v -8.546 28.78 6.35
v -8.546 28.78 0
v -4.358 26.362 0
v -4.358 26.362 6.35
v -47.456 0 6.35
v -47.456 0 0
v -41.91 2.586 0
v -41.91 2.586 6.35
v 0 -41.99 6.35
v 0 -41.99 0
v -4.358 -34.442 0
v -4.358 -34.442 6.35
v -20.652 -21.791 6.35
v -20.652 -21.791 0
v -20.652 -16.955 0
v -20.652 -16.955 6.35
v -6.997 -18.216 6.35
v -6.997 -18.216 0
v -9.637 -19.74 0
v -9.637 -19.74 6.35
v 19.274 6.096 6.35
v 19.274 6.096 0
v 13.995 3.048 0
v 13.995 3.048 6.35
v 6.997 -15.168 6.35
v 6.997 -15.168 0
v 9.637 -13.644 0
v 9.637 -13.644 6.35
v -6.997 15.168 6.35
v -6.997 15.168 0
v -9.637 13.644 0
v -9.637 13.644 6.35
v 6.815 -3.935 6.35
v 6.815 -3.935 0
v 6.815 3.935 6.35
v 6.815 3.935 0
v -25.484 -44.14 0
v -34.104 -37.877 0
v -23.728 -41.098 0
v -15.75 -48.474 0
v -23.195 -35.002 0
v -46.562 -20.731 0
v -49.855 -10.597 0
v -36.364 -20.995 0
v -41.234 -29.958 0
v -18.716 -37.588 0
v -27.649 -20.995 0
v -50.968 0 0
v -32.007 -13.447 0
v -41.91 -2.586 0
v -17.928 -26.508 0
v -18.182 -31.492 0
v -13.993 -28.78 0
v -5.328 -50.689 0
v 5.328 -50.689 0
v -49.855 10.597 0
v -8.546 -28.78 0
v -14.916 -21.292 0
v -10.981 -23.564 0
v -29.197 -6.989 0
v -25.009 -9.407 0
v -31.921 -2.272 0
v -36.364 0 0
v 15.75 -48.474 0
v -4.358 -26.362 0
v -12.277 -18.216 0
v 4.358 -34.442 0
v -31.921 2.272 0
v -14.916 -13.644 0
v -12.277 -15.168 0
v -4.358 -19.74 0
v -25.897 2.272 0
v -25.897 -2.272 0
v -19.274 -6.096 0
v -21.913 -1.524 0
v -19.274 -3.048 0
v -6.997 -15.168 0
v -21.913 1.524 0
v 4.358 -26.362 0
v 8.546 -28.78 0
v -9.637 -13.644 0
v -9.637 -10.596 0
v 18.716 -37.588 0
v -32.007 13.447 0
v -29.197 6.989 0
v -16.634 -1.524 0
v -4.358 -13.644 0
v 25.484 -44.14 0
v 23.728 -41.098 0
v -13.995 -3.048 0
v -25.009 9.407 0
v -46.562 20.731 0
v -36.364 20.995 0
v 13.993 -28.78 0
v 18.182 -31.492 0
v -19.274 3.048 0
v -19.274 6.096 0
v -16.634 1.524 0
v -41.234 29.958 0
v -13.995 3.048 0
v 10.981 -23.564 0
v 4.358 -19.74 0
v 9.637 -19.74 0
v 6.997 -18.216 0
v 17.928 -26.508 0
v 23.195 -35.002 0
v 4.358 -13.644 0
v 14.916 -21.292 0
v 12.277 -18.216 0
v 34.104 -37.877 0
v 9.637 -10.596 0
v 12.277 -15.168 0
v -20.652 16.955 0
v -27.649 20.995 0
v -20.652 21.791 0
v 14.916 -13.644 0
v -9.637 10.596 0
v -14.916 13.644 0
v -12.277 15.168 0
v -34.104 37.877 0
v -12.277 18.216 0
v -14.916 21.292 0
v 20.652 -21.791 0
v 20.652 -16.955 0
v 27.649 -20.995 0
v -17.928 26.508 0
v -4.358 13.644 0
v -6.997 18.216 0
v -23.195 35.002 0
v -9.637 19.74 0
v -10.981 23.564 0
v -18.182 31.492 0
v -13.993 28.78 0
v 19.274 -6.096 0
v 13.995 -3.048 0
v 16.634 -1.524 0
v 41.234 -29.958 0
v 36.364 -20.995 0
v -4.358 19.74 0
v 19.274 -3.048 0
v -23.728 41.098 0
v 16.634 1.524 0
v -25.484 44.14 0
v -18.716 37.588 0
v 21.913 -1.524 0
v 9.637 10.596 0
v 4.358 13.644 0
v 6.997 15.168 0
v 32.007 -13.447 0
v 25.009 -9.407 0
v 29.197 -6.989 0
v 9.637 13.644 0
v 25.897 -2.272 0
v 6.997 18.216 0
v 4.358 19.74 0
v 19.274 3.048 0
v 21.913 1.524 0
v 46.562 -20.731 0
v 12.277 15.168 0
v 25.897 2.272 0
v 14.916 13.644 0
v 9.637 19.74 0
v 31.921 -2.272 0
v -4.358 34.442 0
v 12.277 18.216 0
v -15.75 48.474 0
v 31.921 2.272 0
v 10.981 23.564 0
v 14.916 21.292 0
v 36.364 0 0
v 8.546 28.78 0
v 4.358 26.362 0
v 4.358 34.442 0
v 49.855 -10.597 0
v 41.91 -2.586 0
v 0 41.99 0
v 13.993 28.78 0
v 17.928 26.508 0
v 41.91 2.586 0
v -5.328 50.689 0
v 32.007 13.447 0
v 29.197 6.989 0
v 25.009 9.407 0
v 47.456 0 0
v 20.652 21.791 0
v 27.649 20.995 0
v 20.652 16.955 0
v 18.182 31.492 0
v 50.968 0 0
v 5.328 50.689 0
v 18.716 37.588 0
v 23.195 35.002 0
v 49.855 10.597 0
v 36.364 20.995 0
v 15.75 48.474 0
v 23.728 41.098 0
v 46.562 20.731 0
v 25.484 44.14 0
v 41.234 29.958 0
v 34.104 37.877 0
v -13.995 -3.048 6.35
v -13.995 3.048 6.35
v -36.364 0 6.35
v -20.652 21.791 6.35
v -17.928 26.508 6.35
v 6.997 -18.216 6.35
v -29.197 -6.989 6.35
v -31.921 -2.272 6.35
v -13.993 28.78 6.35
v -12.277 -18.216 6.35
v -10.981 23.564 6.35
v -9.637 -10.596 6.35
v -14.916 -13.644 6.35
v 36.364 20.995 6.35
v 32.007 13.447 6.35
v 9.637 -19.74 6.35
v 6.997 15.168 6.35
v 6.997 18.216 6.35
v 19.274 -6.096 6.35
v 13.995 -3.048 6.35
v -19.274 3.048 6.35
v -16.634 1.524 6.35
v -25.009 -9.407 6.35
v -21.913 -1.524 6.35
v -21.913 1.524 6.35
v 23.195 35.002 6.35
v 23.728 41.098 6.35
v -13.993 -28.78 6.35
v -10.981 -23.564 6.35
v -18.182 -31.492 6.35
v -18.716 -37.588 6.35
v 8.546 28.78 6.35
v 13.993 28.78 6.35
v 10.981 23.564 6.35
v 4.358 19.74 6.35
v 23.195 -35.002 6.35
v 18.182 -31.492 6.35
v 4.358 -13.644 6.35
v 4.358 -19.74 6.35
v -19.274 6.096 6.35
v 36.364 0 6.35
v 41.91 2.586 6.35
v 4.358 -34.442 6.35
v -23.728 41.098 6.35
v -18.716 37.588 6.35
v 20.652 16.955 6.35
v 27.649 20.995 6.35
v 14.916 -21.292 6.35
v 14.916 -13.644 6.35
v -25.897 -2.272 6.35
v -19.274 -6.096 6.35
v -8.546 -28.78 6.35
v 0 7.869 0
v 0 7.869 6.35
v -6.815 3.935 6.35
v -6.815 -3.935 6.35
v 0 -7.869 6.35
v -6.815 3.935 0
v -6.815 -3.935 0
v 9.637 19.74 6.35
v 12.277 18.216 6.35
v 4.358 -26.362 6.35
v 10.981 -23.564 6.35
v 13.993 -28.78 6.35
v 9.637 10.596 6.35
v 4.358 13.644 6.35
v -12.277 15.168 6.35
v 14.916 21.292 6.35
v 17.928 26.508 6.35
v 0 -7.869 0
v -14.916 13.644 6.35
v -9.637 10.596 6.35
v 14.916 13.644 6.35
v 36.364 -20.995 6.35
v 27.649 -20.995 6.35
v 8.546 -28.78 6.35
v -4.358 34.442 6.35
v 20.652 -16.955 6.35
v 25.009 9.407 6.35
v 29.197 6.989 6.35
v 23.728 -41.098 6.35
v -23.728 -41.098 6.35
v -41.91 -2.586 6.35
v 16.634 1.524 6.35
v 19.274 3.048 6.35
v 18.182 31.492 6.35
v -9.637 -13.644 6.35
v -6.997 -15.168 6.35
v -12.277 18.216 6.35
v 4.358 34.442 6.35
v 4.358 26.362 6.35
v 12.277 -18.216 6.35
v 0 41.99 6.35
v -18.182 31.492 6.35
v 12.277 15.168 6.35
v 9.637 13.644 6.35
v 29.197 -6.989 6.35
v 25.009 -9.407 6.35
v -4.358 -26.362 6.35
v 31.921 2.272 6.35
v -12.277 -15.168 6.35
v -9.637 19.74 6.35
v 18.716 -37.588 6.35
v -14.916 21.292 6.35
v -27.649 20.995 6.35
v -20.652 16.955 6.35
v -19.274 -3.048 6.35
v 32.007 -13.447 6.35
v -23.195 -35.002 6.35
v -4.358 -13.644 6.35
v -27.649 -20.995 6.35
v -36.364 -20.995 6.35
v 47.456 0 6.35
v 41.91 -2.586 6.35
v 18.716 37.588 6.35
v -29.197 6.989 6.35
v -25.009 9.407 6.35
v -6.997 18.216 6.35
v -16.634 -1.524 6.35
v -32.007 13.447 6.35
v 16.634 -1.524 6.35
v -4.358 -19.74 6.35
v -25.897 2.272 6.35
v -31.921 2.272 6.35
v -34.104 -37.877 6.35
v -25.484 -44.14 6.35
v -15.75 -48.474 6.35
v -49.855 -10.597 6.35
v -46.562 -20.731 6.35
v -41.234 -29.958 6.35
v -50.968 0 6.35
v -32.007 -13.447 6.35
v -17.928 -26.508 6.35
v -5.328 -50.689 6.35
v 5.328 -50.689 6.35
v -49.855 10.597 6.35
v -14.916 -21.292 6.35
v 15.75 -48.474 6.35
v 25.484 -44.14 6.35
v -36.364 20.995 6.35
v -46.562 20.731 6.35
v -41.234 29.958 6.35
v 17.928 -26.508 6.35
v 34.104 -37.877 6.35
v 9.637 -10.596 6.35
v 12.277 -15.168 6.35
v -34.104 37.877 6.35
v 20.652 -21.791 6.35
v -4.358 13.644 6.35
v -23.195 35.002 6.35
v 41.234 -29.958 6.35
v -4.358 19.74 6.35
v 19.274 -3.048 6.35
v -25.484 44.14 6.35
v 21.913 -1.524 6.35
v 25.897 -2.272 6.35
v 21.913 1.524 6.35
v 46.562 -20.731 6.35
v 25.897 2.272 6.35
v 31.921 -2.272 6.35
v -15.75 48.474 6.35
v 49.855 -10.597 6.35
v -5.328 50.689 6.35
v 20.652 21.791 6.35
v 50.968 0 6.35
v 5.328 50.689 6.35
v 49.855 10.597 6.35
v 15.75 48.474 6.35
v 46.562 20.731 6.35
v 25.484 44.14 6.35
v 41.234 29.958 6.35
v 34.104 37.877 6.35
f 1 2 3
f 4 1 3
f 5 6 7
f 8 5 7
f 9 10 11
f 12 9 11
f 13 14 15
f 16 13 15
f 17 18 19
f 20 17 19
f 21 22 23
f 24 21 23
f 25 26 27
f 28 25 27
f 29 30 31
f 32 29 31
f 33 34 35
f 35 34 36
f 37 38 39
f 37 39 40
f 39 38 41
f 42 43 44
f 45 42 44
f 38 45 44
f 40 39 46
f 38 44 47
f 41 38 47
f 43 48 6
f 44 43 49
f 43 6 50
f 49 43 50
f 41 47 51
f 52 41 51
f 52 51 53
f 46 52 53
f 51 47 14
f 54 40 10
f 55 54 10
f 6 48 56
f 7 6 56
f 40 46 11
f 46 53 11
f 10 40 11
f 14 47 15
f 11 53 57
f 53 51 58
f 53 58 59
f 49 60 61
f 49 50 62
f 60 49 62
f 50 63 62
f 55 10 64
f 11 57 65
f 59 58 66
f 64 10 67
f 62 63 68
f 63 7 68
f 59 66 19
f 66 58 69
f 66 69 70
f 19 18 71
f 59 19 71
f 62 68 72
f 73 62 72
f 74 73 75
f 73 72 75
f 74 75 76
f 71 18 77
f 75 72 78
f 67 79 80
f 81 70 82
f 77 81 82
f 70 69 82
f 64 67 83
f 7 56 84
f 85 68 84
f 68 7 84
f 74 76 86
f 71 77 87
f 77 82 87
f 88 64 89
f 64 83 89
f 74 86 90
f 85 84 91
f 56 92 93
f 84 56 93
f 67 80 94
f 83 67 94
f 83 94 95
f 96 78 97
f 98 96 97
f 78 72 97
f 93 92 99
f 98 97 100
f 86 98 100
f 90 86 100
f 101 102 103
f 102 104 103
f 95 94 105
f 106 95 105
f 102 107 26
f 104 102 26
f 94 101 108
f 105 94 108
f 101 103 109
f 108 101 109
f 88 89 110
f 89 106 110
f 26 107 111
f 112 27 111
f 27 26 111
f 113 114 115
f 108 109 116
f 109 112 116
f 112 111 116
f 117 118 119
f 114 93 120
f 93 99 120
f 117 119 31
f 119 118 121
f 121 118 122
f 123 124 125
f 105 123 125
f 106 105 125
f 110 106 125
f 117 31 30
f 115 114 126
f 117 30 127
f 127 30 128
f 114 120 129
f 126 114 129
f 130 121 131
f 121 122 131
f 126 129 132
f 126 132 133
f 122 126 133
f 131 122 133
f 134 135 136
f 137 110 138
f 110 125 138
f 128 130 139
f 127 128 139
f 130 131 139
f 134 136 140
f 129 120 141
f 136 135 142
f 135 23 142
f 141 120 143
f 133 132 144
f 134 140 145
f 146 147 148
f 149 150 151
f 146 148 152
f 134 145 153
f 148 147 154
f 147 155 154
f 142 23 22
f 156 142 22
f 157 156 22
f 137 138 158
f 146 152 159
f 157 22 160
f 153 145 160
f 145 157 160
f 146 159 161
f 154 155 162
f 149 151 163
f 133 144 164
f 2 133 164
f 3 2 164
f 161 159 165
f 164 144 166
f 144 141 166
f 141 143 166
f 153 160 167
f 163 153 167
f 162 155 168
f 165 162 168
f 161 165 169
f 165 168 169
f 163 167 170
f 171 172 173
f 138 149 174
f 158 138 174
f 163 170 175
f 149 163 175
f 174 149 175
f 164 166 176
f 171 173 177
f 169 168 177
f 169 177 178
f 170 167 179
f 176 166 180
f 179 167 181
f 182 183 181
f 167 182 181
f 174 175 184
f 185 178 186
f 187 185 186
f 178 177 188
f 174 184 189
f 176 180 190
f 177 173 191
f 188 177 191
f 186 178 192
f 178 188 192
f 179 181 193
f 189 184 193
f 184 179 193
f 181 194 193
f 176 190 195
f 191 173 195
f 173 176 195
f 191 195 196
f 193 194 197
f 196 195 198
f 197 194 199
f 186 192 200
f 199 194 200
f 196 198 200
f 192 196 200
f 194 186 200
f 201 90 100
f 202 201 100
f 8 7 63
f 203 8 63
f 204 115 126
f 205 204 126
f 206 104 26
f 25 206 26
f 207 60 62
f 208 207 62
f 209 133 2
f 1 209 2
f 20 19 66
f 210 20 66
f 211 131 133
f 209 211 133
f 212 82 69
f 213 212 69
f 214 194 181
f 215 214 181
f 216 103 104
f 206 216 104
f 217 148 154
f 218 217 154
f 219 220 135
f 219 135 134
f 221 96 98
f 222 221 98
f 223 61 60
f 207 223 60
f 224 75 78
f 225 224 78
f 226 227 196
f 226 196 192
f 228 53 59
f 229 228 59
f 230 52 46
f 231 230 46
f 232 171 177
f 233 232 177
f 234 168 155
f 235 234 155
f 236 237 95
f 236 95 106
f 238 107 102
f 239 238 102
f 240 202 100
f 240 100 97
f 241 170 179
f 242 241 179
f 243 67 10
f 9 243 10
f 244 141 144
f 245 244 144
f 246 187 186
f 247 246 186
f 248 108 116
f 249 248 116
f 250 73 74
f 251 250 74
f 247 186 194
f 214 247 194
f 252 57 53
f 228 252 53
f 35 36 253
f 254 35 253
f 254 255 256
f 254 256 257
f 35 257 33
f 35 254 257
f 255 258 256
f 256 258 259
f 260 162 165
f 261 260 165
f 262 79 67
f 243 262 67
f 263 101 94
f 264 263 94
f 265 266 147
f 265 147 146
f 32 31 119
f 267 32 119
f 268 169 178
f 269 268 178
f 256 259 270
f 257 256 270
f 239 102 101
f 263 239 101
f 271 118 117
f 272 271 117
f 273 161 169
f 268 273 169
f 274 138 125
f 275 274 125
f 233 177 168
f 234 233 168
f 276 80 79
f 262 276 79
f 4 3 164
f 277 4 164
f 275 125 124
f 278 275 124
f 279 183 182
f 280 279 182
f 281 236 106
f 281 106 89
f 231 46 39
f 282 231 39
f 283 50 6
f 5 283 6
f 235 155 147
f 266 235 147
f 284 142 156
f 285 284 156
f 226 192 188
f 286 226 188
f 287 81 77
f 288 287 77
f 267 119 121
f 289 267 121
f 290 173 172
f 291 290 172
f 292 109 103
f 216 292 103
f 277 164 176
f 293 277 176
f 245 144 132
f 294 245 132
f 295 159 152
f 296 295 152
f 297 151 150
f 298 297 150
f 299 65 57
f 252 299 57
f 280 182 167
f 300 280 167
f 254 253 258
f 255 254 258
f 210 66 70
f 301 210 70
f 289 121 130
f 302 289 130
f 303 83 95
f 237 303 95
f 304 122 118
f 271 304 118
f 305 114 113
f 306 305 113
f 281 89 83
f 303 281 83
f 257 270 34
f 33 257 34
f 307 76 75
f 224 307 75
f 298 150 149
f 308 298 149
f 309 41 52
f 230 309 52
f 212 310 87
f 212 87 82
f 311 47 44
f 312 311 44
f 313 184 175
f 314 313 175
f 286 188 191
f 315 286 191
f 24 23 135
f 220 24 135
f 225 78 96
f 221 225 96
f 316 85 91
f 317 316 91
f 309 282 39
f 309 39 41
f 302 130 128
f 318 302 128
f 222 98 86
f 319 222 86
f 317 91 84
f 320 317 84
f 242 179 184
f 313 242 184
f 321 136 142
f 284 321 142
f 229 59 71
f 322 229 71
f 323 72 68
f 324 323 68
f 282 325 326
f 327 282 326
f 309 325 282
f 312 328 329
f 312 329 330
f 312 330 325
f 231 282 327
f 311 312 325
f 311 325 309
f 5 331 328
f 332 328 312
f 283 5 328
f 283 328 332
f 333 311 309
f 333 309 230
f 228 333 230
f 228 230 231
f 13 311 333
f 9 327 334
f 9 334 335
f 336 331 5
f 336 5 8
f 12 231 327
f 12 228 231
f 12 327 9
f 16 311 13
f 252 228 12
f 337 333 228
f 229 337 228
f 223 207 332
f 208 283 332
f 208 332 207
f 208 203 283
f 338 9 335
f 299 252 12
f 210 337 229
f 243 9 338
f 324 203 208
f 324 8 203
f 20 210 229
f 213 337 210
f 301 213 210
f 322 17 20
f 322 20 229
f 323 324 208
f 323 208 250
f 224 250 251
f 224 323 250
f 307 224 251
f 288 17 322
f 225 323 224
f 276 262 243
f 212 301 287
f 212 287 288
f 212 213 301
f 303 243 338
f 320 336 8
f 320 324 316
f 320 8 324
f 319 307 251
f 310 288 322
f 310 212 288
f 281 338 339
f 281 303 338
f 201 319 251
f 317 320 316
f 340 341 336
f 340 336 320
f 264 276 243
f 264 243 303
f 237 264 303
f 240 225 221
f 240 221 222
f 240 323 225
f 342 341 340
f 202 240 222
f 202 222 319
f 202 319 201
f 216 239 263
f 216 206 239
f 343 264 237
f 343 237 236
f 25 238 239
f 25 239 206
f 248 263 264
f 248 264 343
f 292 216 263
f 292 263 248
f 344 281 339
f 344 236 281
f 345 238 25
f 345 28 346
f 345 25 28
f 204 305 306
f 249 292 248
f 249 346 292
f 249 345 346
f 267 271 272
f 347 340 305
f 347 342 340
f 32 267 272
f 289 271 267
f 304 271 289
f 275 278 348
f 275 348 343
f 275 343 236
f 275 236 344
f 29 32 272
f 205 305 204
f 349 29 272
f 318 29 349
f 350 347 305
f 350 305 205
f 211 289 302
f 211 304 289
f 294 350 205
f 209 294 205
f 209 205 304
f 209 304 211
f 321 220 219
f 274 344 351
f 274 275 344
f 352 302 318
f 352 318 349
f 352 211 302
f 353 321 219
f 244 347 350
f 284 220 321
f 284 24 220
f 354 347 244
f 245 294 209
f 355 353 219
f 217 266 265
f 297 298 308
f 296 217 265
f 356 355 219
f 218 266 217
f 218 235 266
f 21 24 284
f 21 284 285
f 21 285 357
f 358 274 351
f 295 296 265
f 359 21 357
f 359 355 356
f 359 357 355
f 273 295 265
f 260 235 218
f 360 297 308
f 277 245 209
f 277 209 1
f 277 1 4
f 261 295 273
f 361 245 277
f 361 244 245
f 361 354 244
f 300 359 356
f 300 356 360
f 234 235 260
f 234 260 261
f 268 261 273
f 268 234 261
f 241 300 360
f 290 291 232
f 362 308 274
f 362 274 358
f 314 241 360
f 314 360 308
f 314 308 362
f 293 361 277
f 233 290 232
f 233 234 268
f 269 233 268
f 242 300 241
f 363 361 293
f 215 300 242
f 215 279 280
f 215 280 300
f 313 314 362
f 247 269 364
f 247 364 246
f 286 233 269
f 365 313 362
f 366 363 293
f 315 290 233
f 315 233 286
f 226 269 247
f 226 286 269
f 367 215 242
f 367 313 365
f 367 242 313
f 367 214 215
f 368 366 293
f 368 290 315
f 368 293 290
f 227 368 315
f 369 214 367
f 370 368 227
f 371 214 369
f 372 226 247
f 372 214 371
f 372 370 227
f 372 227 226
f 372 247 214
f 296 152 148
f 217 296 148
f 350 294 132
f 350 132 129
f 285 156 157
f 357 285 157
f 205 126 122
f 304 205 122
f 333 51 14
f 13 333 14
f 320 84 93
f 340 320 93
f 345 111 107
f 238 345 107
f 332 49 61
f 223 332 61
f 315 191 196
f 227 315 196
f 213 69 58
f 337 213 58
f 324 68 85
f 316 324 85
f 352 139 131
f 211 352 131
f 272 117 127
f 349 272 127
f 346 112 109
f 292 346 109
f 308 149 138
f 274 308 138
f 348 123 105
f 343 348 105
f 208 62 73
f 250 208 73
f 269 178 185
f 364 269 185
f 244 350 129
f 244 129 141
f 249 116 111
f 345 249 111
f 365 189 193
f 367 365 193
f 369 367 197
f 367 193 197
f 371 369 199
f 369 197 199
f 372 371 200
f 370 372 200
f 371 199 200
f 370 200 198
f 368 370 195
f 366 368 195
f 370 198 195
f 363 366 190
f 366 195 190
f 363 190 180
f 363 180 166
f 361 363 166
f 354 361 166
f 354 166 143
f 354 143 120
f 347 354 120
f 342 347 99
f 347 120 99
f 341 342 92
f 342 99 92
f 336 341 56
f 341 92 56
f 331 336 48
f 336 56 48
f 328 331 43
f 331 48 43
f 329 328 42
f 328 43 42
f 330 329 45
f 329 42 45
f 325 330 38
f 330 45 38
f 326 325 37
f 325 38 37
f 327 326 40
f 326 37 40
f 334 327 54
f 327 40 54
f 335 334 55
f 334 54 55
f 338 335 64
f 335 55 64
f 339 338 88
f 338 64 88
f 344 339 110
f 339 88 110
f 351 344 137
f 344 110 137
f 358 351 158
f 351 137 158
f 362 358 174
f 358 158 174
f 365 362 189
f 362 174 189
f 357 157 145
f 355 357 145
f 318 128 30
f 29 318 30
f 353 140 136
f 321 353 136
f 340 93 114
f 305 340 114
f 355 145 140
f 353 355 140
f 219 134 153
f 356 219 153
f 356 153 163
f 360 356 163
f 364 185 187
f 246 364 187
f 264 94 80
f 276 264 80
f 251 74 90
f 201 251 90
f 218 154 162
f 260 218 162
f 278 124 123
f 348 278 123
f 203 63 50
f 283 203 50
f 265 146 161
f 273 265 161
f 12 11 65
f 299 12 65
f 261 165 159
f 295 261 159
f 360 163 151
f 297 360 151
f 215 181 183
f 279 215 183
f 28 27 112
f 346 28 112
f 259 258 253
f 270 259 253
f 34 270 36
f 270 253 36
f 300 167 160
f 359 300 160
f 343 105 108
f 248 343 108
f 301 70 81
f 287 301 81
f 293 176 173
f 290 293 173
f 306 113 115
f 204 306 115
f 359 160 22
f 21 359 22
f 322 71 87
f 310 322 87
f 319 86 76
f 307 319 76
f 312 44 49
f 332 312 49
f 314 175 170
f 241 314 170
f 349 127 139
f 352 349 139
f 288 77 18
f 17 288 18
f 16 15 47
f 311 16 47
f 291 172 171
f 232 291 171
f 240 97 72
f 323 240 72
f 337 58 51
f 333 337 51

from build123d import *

# Parameters (mm, degrees)
F0_R     = 50.968365
F1_DEPTH = 6.35


with BuildPart() as f1:
    # F0 (on Top) → F1 (new body)
    with BuildSketch(Plane.XY):
        Circle(F0_R)
        Polygon((-23.194751, -35.002316), (-18.182196, -31.492487), (-18.715519, -37.588402), (-23.728075, -41.098231), align=None, mode=Mode.SUBTRACT)
        Polygon((-41.91027, 2.586086), (-36.364391, 0), (-41.91027, -2.586086), (-47.456149, 0), align=None, mode=Mode.SUBTRACT)
        Polygon((-12.276566, -15.167637), (-9.636921, -13.643637), (-6.997276, -15.167637), (-6.997276, -18.215637), (-9.636921, -19.739637), (-12.276566, -18.215637), align=None, mode=Mode.SUBTRACT)
        Polygon((-19.273842, -3.048), (-21.913487, -1.524), (-21.913487, 1.524), (-19.273842, 3.048), (-16.634197, 1.524), (-16.634197, -1.524), align=None, mode=Mode.SUBTRACT)
        Polygon((-4.35763, 34.442345), (0, 41.989982), (4.35763, 34.442345), (4.35763, 26.362316), (8.5457, 28.780299), (13.992773, 28.780299), (10.980901, 23.563584), (4.35763, 19.739637), (4.35763, 13.643637), (9.636921, 10.595637), (14.916212, 13.643637), (14.916212, 21.291532), (17.928084, 26.508247), (20.65162, 21.790943), (20.65162, 16.954976), (27.649131, 20.994991), (36.364391, 20.994991), (32.006761, 13.447354), (25.009251, 9.40734), (29.19732, 6.989357), (31.920857, 2.272053), (25.897113, 2.272053), (19.273842, 6.096), (13.994551, 3.048), (13.994551, -3.048), (19.273842, -6.096), (25.897113, -2.272053), (31.920857, -2.272053), (29.19732, -6.989357), (25.009251, -9.40734), (32.006761, -13.447354), (36.364391, -20.994991), (27.649131, -20.994991), (20.65162, -16.954976), (20.65162, -21.790943), (17.928084, -26.508247), (14.916212, -21.291532), (14.916212, -13.643637), (9.636921, -10.595637), (4.35763, -13.643637), (4.35763, -19.739637), (10.980901, -23.563584), (13.992773, -28.780299), (8.5457, -28.780299), (4.35763, -26.362316), (4.35763, -34.442345), (0, -41.989982), (-4.35763, -34.442345), (-4.35763, -26.362316), (-8.5457, -28.780299), (-13.992773, -28.780299), (-10.980901, -23.563584), (-4.35763, -19.739637), (-4.35763, -13.643637), (-9.636921, -10.595637), (-14.916212, -13.643637), (-14.916212, -21.291532), (-17.928084, -26.508247), (-20.65162, -21.790943), (-20.65162, -16.954976), (-27.649131, -20.994991), (-36.364391, -20.994991), (-32.006761, -13.447354), (-25.009251, -9.40734), (-29.19732, -6.989357), (-31.920857, -2.272053), (-25.897113, -2.272053), (-19.273842, -6.096), (-13.994551, -3.048), (-13.994551, 3.048), (-19.273842, 6.096), (-25.897113, 2.272053), (-31.920857, 2.272053), (-29.19732, 6.989357), (-25.009251, 9.40734), (-32.006761, 13.447354), (-36.364391, 20.994991), (-27.649131, 20.994991), (-20.65162, 16.954976), (-20.65162, 21.790943), (-17.928084, 26.508247), (-14.916212, 21.291532), (-14.916212, 13.643637), (-9.636921, 10.595637), (-4.35763, 13.643637), (-4.35763, 19.739637), (-10.980901, 23.563584), (-13.992773, 28.780299), (-8.5457, 28.780299), (-4.35763, 26.362316), align=None, mode=Mode.SUBTRACT)
        Polygon((18.182196, -31.492487), (23.194751, -35.002316), (23.728075, -41.098231), (18.715519, -37.588402), align=None, mode=Mode.SUBTRACT)
        Polygon((12.276566, -15.167637), (12.276566, -18.215637), (9.636921, -19.739637), (6.997276, -18.215637), (6.997276, -15.167637), (9.636921, -13.643637), align=None, mode=Mode.SUBTRACT)
        Polygon((16.634197, 1.524), (19.273842, 3.048), (21.913487, 1.524), (21.913487, -1.524), (19.273842, -3.048), (16.634197, -1.524), align=None, mode=Mode.SUBTRACT)
        Polygon((-9.636921, 19.739637), (-6.997276, 18.215637), (-6.997276, 15.167637), (-9.636921, 13.643637), (-12.276566, 15.167637), (-12.276566, 18.215637), align=None, mode=Mode.SUBTRACT)
        Polygon((-23.194751, 35.002316), (-23.728075, 41.098231), (-18.715519, 37.588402), (-18.182196, 31.492487), align=None, mode=Mode.SUBTRACT)
        Polygon((6.997276, 18.215637), (9.636921, 19.739637), (12.276566, 18.215637), (12.276566, 15.167637), (9.636921, 13.643637), (6.997276, 15.167637), align=None, mode=Mode.SUBTRACT)
        Polygon((47.456149, 0), (41.91027, -2.586086), (36.364391, 0), (41.91027, 2.586086), align=None, mode=Mode.SUBTRACT)
        Polygon((23.728075, 41.098231), (23.194751, 35.002316), (18.182196, 31.492487), (18.715519, 37.588402), align=None, mode=Mode.SUBTRACT)
        Polygon((6.814862, 3.934563), (0, 7.869125), (-6.814862, 3.934563), (-6.814862, -3.934563), (0, -7.869125), (6.814862, -3.934563), align=None)
    extrude(amount=F1_DEPTH)


solid = f1.part
